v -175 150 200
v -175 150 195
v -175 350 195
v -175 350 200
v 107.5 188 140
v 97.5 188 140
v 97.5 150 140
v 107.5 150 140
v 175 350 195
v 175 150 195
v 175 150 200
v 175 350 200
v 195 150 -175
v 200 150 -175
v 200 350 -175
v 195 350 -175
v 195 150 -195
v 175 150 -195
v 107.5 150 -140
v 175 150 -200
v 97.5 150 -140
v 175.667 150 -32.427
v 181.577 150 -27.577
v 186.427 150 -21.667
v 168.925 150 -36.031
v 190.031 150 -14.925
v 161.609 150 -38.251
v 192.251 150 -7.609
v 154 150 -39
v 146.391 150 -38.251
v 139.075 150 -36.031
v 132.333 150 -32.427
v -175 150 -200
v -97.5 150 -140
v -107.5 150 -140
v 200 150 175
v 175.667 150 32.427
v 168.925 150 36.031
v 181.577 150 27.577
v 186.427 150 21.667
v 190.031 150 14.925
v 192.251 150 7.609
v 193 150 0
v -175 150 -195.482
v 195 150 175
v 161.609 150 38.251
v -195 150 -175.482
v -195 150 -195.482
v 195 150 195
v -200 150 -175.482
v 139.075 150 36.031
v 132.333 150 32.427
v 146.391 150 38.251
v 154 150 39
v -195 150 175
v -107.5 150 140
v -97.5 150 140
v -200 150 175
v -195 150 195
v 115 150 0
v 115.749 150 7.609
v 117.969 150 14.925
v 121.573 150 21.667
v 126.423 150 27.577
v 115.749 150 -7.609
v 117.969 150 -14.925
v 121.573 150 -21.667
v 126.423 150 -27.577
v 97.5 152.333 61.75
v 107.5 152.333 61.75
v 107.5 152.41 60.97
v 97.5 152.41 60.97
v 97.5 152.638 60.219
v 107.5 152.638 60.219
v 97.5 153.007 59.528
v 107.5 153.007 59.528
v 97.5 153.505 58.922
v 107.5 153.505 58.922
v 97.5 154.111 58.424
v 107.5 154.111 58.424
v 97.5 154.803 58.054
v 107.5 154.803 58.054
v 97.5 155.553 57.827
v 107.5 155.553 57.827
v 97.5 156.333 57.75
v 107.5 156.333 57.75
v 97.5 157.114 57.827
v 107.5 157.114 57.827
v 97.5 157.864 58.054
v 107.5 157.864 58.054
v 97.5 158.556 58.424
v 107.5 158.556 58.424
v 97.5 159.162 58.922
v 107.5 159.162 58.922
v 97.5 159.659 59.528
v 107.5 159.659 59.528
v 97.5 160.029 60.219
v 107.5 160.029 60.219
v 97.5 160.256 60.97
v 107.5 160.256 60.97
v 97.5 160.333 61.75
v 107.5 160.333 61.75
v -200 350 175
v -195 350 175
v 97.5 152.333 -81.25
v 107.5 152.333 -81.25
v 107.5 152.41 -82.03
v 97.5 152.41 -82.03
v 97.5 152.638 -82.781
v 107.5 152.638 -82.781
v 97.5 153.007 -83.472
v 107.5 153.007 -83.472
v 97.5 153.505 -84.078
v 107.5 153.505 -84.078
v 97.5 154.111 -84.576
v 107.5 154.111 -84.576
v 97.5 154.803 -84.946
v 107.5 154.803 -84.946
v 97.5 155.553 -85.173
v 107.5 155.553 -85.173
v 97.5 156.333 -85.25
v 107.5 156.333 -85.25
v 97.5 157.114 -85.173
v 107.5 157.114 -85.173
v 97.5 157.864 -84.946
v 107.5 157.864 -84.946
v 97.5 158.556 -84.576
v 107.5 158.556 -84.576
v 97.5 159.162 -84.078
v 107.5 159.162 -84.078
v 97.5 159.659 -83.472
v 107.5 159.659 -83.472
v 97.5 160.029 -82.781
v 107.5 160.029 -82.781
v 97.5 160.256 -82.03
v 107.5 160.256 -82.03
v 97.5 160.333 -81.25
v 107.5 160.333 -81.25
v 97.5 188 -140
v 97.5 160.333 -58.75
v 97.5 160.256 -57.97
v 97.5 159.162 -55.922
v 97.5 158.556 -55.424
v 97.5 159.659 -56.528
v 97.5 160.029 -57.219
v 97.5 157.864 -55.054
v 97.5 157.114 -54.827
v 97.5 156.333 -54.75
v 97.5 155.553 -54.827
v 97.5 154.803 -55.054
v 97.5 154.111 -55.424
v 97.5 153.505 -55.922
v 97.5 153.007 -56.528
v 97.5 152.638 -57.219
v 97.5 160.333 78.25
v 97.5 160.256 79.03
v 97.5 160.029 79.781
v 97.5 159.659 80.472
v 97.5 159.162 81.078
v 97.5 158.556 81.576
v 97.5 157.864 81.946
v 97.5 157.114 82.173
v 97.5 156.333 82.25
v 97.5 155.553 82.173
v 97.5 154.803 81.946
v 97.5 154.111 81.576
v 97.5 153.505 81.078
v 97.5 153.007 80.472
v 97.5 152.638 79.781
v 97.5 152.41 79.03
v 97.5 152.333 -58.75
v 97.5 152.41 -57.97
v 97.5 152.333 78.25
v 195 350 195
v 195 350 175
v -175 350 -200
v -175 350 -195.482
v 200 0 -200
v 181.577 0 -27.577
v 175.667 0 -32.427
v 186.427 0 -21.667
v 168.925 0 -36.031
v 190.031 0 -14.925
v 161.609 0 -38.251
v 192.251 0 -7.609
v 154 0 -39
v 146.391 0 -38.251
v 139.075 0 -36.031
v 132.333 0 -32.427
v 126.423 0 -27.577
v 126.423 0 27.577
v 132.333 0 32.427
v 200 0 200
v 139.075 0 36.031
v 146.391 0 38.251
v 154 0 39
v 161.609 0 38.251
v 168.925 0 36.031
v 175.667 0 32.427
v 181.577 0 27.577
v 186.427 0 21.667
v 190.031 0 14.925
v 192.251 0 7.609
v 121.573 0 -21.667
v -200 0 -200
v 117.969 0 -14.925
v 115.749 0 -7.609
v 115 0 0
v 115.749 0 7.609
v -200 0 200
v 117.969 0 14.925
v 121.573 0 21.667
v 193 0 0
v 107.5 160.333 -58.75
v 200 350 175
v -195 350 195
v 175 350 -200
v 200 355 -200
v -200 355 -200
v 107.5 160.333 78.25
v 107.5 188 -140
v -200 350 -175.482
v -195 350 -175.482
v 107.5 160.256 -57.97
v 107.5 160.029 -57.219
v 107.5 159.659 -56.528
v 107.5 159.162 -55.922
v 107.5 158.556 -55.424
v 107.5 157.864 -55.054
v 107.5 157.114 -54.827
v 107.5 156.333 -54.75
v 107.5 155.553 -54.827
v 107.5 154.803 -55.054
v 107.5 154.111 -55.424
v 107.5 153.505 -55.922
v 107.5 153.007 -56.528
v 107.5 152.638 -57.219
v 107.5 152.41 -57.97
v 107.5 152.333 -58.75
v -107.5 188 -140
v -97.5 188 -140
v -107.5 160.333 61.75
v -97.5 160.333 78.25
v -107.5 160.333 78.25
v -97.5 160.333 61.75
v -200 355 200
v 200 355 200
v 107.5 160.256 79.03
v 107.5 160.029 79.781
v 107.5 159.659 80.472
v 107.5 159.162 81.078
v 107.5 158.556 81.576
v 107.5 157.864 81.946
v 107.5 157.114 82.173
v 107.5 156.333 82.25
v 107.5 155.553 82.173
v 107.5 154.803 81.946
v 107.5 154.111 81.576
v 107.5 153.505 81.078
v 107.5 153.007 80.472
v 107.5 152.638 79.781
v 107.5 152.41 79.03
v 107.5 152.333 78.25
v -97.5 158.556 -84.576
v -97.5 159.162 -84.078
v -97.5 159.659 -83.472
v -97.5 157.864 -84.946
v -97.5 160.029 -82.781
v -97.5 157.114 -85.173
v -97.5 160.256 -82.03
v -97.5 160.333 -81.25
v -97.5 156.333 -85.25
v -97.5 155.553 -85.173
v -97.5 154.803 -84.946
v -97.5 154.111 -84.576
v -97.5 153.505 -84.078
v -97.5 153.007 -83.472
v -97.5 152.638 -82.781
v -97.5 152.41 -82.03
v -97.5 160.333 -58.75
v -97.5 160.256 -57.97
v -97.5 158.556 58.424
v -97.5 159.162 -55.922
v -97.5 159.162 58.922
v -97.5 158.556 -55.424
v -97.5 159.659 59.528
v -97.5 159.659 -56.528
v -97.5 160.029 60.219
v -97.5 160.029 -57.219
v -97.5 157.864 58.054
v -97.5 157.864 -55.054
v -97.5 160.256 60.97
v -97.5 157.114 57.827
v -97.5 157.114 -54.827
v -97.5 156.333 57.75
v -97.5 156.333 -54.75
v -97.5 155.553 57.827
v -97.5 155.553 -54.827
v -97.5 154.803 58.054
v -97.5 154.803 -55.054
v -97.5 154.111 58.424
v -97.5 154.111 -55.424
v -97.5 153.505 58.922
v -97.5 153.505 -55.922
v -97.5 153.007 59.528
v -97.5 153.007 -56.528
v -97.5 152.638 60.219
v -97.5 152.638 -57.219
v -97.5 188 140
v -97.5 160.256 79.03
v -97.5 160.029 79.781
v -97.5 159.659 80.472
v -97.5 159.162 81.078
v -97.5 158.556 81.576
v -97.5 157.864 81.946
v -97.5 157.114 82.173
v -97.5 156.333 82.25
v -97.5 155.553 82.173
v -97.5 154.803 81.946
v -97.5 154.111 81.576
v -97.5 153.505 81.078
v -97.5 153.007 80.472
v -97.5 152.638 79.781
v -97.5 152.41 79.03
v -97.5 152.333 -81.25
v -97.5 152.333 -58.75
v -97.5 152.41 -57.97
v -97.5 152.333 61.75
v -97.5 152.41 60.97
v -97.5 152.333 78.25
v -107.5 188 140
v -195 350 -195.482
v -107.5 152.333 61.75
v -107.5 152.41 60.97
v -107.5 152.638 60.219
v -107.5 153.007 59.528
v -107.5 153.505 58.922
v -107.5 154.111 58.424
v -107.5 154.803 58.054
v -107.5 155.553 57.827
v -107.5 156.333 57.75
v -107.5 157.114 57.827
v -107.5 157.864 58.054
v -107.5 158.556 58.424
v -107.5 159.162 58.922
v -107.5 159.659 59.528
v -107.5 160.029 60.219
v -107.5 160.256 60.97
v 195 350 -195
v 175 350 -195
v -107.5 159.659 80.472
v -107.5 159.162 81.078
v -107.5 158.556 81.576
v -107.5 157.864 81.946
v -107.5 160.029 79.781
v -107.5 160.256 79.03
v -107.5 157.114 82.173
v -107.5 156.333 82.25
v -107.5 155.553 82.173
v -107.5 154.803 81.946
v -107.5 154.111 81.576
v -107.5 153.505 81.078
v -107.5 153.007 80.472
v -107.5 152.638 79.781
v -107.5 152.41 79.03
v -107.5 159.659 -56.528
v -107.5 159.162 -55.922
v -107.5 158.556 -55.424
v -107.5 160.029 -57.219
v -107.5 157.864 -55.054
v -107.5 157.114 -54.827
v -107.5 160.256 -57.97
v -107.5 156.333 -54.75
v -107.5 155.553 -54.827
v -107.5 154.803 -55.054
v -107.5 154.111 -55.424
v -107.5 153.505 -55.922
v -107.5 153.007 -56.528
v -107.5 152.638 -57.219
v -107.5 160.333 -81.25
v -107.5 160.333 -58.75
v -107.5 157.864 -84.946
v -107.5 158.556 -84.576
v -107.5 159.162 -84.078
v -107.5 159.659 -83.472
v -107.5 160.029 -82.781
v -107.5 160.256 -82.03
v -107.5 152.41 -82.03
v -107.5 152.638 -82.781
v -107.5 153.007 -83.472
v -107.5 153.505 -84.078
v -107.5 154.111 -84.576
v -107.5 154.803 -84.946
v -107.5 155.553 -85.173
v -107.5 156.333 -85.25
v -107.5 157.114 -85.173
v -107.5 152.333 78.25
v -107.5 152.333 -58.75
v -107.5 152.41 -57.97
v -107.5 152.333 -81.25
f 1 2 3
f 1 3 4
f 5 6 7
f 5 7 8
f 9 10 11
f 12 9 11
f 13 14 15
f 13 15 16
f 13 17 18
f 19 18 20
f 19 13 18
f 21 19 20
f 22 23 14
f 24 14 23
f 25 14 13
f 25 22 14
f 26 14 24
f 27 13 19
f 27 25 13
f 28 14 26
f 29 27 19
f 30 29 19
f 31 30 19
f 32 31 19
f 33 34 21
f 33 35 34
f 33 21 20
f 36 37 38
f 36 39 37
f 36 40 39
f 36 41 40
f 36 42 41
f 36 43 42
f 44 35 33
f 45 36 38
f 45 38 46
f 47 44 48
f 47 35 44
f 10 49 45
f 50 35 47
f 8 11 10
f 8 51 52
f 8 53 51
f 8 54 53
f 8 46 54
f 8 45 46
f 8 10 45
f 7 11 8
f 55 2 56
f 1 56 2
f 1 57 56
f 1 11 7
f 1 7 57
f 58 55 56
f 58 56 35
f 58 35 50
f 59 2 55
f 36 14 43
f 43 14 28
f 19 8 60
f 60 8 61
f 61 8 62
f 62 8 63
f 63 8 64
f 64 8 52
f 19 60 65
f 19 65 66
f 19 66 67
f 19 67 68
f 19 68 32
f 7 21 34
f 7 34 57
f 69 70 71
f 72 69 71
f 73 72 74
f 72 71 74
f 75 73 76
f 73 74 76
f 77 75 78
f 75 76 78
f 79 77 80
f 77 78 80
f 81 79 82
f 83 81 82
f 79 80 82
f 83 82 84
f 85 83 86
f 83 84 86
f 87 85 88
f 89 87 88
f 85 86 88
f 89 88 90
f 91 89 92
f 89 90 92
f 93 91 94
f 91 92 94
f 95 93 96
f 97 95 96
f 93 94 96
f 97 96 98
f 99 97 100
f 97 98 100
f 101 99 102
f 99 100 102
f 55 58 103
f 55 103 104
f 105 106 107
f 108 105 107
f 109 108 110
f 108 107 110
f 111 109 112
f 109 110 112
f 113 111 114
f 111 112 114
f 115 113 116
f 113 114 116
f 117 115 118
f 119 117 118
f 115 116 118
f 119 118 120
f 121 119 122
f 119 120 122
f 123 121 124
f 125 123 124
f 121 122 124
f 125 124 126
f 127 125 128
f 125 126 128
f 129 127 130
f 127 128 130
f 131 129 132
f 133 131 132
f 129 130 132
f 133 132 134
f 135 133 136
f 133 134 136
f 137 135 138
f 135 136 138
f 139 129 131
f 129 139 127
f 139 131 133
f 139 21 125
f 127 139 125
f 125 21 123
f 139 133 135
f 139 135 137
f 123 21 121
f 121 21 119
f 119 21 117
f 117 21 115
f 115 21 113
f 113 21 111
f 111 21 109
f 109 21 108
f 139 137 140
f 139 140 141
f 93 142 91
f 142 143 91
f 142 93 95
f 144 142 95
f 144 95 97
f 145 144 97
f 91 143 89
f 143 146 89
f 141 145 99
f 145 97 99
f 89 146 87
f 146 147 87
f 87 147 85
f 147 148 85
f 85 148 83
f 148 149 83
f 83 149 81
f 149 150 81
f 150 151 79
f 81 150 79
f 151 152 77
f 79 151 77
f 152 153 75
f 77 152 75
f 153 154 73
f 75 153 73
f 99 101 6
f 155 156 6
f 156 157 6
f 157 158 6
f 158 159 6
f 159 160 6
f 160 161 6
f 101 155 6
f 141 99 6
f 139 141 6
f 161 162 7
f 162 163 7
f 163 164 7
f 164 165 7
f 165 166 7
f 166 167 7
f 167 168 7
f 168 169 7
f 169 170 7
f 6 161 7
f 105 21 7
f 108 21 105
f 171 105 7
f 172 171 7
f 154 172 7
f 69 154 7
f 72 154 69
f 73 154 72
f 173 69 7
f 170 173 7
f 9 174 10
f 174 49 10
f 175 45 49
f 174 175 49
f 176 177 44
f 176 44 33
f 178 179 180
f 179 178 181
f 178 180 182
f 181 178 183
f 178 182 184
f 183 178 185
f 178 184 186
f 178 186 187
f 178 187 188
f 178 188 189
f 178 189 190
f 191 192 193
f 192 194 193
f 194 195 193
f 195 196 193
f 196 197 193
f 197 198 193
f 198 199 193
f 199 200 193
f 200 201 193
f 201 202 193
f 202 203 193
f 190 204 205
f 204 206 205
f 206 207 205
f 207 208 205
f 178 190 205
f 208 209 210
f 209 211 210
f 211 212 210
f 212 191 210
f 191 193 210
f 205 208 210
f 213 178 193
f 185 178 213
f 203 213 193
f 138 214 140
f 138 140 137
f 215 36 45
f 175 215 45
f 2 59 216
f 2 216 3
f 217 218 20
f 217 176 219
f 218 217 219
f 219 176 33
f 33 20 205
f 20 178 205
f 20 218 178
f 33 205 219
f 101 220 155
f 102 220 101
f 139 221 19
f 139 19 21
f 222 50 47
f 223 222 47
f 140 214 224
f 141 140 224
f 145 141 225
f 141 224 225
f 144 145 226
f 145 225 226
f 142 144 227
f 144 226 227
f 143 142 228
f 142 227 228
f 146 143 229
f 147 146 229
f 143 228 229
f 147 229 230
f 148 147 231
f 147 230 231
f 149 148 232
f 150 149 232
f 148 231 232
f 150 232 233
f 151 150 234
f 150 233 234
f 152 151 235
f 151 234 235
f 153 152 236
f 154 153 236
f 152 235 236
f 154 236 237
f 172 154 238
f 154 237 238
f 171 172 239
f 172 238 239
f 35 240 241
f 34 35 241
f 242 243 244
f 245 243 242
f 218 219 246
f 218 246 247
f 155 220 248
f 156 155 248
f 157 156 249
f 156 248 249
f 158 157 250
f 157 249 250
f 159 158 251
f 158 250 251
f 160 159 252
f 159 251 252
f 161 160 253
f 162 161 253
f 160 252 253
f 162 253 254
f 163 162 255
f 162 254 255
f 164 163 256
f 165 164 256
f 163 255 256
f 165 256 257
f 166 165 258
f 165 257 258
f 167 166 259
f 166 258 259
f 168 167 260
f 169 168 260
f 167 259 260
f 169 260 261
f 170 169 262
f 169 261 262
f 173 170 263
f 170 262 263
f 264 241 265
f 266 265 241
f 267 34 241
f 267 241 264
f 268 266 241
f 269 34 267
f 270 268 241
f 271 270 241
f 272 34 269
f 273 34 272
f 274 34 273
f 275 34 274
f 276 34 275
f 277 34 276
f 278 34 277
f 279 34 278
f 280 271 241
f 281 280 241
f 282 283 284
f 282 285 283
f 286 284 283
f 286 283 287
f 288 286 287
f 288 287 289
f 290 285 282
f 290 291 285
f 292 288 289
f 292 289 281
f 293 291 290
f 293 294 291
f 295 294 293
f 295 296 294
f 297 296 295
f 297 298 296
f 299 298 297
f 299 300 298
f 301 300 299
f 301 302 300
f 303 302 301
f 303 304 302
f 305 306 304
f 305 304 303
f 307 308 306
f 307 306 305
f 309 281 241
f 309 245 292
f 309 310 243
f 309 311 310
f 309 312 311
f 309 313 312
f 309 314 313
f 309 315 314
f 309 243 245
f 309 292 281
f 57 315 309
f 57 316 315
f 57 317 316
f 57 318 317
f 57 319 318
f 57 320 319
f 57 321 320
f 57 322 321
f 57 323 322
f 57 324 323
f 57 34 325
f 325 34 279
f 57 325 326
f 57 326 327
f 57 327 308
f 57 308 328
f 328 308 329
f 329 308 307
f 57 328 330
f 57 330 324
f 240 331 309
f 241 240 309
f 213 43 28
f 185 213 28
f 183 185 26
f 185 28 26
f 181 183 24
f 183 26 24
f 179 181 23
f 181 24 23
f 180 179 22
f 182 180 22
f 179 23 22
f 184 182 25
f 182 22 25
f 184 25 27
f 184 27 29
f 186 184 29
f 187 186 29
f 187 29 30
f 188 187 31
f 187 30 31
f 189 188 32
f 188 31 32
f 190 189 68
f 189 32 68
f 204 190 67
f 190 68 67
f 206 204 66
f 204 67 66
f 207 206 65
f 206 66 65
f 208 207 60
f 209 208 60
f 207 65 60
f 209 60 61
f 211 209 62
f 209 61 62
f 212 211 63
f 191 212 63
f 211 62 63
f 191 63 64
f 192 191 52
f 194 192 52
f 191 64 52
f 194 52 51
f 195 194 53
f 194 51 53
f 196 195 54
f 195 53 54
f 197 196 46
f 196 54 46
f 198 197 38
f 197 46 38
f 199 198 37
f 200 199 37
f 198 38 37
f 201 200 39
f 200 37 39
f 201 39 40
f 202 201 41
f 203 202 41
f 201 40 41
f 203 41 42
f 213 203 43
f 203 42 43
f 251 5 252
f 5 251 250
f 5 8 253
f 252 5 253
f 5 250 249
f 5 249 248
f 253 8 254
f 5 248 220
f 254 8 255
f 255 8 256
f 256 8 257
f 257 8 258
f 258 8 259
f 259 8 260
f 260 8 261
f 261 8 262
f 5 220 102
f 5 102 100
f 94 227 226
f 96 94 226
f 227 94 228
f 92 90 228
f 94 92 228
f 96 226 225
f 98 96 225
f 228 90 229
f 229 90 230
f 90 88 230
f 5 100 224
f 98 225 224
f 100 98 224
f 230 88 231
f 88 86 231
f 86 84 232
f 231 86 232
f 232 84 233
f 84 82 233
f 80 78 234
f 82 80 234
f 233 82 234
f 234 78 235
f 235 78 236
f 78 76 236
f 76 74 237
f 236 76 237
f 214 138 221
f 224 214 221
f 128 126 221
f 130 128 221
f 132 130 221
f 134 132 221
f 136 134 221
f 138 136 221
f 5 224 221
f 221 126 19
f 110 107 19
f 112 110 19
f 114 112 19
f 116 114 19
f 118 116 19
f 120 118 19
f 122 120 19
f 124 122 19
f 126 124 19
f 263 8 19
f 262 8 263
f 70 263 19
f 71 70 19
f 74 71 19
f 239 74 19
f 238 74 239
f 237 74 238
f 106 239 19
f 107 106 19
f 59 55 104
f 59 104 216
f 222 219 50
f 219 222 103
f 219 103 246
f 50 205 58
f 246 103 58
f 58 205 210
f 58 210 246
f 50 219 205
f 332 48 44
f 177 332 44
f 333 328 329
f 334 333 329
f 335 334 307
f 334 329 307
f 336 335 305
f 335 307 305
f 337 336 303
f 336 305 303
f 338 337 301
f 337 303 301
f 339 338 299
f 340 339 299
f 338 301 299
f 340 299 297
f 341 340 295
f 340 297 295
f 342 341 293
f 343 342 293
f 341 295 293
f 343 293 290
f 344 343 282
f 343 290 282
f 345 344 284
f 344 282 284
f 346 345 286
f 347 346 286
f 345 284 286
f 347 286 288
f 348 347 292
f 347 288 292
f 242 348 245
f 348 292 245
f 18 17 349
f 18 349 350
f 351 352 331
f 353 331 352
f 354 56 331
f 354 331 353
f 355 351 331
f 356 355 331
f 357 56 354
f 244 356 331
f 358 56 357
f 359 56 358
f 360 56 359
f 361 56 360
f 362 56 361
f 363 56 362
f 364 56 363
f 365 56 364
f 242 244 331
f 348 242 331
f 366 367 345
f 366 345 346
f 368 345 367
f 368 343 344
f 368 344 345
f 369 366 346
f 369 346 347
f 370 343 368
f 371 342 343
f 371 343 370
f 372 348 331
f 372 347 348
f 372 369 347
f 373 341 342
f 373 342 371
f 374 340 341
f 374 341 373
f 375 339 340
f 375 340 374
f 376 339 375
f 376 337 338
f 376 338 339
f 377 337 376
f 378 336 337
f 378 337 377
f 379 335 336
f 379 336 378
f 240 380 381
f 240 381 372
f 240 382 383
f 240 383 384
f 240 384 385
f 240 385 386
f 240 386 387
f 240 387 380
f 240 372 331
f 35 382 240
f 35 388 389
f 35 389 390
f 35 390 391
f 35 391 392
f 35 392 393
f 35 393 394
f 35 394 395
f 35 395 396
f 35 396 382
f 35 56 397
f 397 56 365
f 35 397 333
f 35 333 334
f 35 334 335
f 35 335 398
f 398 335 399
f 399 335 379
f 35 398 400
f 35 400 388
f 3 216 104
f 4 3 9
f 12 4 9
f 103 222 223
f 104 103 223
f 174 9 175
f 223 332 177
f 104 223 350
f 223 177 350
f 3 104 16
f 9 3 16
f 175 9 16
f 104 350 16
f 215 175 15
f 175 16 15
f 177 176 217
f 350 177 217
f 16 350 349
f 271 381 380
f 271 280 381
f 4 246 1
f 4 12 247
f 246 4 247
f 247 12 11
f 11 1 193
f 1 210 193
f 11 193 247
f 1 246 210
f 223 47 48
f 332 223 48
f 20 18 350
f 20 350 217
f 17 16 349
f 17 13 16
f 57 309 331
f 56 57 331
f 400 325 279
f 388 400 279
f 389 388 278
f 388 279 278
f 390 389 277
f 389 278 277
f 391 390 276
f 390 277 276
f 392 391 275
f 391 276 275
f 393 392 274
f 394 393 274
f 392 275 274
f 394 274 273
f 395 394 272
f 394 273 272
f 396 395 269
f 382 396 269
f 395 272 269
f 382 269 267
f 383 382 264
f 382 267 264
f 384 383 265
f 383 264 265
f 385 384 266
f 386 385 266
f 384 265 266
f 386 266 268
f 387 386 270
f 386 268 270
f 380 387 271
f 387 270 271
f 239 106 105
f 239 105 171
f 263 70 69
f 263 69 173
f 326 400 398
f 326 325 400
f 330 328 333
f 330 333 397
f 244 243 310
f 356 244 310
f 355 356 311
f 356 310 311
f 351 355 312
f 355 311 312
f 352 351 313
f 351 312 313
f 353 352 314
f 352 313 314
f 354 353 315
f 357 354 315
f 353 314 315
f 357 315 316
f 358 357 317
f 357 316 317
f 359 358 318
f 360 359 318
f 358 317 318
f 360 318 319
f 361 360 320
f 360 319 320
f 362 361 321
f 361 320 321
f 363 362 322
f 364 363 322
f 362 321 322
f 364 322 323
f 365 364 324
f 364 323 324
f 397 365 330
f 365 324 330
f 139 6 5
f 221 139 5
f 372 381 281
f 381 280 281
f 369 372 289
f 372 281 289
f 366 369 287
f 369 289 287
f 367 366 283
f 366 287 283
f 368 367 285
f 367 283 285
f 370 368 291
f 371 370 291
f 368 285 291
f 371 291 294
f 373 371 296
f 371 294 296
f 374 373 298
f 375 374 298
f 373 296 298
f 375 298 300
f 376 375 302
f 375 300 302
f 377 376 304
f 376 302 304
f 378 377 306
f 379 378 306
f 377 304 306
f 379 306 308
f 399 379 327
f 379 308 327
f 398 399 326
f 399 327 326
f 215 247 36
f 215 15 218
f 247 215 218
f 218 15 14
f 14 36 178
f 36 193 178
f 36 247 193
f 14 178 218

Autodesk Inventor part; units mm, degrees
ref_plane "YZ Plane" through (0, 0, 0) normal (1, 0, 0) x (0, 1, 0)
ref_plane "XZ Plane" through (0, 0, 0) normal (0, 1, 0) x (-1, 0, 0)
ref_plane "XY Plane" through (0, 0, 0) normal (0, 0, 1) x (1, 0, 0)
sketch "Boceto1" plane through (0, 0, 0) normal (0, 1, 0) x (-1, 0, 0)
  line L0 (200, 200) -> (-200, 200)
  line L1 (-200, 200) -> (-200, -200)
  line L2 (-200, -200) -> (200, -200)
  line L3 (200, -200) -> (200, 200)
  point P0 (0, 0)
  dimension "d0" = 400
  dimension "L" = 400
  dimension "d2" = 200
  dimension "d3" = 200
extrude "Extrusión1" add sketch "Boceto1" along normal blind 150
sketch "Boceto3" plane through (0, 150, 0) normal (0, 1, 0) x (1, 0, 0)
  circle A0 centre (0, -121) radius 39
  line L0 (200, 200) -> (-200, 200) projected
  line L1 (-200, -200) -> (200, -200) projected
  point P0 (0, 0)
  dimension "D" = 78
  dimension "d27" = 79
extrude "Extrusión2" [suppressed]
ref_plane "Plano de trabajo1" through (0, 0, 200) normal (1, 0, 0) x (0, 0, -1)
ref_plane "Plano de trabajo2" through (-200, 0, 0) normal (0, 0, 1) x (1, 0, 0)
sketch "Boceto4" plane through (0, 150, 0) normal (0, 1, 0) x (1, 0, 0)
  line L0 (-97.5, 140) -> (-97.5, -140)
  line L1 (97.5, 140) -> (97.5, -140)
  line L2 (200, 200) -> (-200, 200) projected
  circle A0 centre (0, -121) radius 39 projected
  line L3 (-200, -200) -> (200, -200) projected
  line L4 (-97.5, -140) -> (-107.5, -140)
  line L5 (-107.5, -140) -> (-107.5, 140)
  line L6 (-107.5, 140) -> (-97.5, 140)
  line L7 (-97.5, 140) -> (-97.5, -140)
  line L8 (97.5, -140) -> (107.5, -140)
  line L9 (107.5, -140) -> (107.5, 140)
  line L10 (107.5, 140) -> (97.5, 140)
  line L11 (97.5, 140) -> (97.5, -140)
  point P0 (0, 0)
  dimension "Lriel" = 280
  dimension "d13" = 60
  dimension "d14" = 280
  dimension "d15" = 60
  dimension "d19" = 10
  dimension "d20" = 280
  dimension "d21" = 97.5
  dimension "d22" = 10
  dimension "d23" = 280
  dimension "d24" = 97.5
extrude "Extrusión3" add sketch "Boceto4" along normal blind 38 contours L0 L4 L5 L6 | L10 L9 L8 L1
sketch "Boceto5" plane through (0, 150, 0) normal (0, 1, 0) x (1, 0, 0)
  line L0 (-200, 200) -> (-200, -200) projected
  line L1 (-200, 200) -> (-200, 175)
  line L2 (-200, 175.482) -> (-195, 175.482)
  line L3 (-195, 175.482) -> (-195, 195.482)
  line L4 (-195, 195.482) -> (-175, 195.482)
  line L5 (-175, 195.482) -> (-175, 200)
  line L6 (200, 200) -> (-200, 200) projected
  line L7 (-200, 200) -> (-175, 200)
  line L8 (-200, -200) -> (-200, -175)
  line L9 (-200, -175) -> (-195, -175)
  line L10 (-195, -175) -> (-195, -195)
  line L11 (-195, -195) -> (-175, -195)
  line L12 (-175, -195) -> (-175, -200)
  line L13 (-200, -200) -> (200, -200) projected
  line L14 (-175, -200) -> (-200, -200)
  line L15 (200, -200) -> (200, 200) projected
  line L16 (200, -200) -> (200, -175)
  line L17 (200, -175) -> (195, -175)
  line L18 (195, -175) -> (195, -195)
  line L19 (195, -195) -> (175, -195)
  line L20 (175, -195) -> (175, -200)
  line L21 (200, -200) -> (175, -200)
  line L22 (200, 200) -> (200, 175)
  line L23 (200, 175) -> (195, 175)
  line L24 (195, 175) -> (195, 195)
  line L25 (195, 195) -> (175, 195)
  line L26 (175, 195) -> (175, 200)
  line L27 (200, 200) -> (175, 200)
  point P0 (0, 0)
  dimension "d28" = 25
  dimension "d29" = 5
  dimension "d30" = 20
  dimension "d31" = 20
  dimension "d32" = 25
  dimension "d33" = 5
  dimension "d34" = 20
  dimension "d35" = 20
  dimension "d36" = 25
  dimension "d37" = 5
  dimension "d38" = 20
  dimension "d39" = 20
  dimension "d40" = 25
  dimension "d41" = 5
  dimension "d42" = 20
  dimension "d43" = 20
extrude "Extrusión4" add sketch "Boceto5" along normal blind 200 contours L6 L5 L4 L3 L2 L0 | L6 L15 L23 L24 L25 L26 | L9 L10 L11 L12 L13 L0 | L15 L13 L20 L19 L18 L17
sketch "Boceto6" plane through (0, 350, 0) normal (0, 1, 0) x (1, 0, 0)
  line L0 (-200, 200) -> (-200, -200) projected
  line L1 (-200, -200) -> (200, -200)
  line L2 (200, -200) -> (200, 200)
  line L3 (200, 200) -> (-200, 200)
  line L4 (-200, 200) -> (-200, -200)
  point P0 (0, 0)
extrude "Extrusión5" add sketch "Boceto6" along normal blind 5
sketch "Boceto7" plane through (0, 150, 0) normal (0, 1, 0) x (1, 0, 0)
  line L0 (-200, 200) -> (-200, -200) projected
  line L1 (200, 200) -> (-200, 200) projected
  line L2 (200, -200) -> (200, 200) projected
  line L3 (-200, -200) -> (200, -200) projected
  circle A0 centre (154, 0) radius 39
  point P0 (0, 0)
  dimension "d48" = 78
  dimension "d49" = 200
  dimension "d50" = 46
extrude "Extrusión6" cut sketch "Boceto7" against normal blind 200.5 contours A0
sketch "Boceto8" plane through (107.5, 150, 140) normal (1, 0, 0) x (0, 0, -1)
  line L0 (61.75, 6.3333) -> (78.25, 6.3333) construction
  line L1 (61.75, 10.3333) -> (78.25, 10.3333)
  line L2 (78.25, 2.3333) -> (61.75, 2.3333)
  arc A0 (61.75, 10.3333) -> (61.75, 2.3333) centre (61.75, 6.3333) ccw
  arc A1 (78.25, 2.3333) -> (78.25, 10.3333) centre (78.25, 6.3333) ccw
  line L3 (0, 38) -> (280, 38) projected
  line L4 (0, 0) -> (0, 38) projected
  line L5 (198.75, 6.3333) -> (221.25, 6.3333) construction
  line L6 (315.482, 0) -> (-35, 0) projected
  line L7 (198.75, 10.3333) -> (221.25, 10.3333)
  line L8 (221.25, 2.3333) -> (198.75, 2.3333)
  arc A2 (198.75, 10.3333) -> (198.75, 2.3333) centre (198.75, 6.3333) ccw
  arc A3 (221.25, 2.3333) -> (221.25, 10.3333) centre (221.25, 6.3333) ccw
  line L9 (280, 0) -> (280, 38) projected
  point P0 (140, -150)
  point P1 (70, 6.3333)
  point P2 (210, 6.3333)
  dimension "d53" = 31.6667
  dimension "d54" = 70
  dimension "d55" = 4
  dimension "d56" = 31.6667
  dimension "d57" = 4
  dimension "d58" = 70
extrude "Extrusión7" cut sketch "Boceto8" against normal blind 251.25 contours L1 A1 L2 A0 | L7 A3 L8 A2
equation "\"d0\" = L"
equation "\"d2\" = 0.5 * L"
equation "\"d3\" = 0.5 * L"
equation "\"d14\" = Lriel"
properties part number "CajaBoya"
